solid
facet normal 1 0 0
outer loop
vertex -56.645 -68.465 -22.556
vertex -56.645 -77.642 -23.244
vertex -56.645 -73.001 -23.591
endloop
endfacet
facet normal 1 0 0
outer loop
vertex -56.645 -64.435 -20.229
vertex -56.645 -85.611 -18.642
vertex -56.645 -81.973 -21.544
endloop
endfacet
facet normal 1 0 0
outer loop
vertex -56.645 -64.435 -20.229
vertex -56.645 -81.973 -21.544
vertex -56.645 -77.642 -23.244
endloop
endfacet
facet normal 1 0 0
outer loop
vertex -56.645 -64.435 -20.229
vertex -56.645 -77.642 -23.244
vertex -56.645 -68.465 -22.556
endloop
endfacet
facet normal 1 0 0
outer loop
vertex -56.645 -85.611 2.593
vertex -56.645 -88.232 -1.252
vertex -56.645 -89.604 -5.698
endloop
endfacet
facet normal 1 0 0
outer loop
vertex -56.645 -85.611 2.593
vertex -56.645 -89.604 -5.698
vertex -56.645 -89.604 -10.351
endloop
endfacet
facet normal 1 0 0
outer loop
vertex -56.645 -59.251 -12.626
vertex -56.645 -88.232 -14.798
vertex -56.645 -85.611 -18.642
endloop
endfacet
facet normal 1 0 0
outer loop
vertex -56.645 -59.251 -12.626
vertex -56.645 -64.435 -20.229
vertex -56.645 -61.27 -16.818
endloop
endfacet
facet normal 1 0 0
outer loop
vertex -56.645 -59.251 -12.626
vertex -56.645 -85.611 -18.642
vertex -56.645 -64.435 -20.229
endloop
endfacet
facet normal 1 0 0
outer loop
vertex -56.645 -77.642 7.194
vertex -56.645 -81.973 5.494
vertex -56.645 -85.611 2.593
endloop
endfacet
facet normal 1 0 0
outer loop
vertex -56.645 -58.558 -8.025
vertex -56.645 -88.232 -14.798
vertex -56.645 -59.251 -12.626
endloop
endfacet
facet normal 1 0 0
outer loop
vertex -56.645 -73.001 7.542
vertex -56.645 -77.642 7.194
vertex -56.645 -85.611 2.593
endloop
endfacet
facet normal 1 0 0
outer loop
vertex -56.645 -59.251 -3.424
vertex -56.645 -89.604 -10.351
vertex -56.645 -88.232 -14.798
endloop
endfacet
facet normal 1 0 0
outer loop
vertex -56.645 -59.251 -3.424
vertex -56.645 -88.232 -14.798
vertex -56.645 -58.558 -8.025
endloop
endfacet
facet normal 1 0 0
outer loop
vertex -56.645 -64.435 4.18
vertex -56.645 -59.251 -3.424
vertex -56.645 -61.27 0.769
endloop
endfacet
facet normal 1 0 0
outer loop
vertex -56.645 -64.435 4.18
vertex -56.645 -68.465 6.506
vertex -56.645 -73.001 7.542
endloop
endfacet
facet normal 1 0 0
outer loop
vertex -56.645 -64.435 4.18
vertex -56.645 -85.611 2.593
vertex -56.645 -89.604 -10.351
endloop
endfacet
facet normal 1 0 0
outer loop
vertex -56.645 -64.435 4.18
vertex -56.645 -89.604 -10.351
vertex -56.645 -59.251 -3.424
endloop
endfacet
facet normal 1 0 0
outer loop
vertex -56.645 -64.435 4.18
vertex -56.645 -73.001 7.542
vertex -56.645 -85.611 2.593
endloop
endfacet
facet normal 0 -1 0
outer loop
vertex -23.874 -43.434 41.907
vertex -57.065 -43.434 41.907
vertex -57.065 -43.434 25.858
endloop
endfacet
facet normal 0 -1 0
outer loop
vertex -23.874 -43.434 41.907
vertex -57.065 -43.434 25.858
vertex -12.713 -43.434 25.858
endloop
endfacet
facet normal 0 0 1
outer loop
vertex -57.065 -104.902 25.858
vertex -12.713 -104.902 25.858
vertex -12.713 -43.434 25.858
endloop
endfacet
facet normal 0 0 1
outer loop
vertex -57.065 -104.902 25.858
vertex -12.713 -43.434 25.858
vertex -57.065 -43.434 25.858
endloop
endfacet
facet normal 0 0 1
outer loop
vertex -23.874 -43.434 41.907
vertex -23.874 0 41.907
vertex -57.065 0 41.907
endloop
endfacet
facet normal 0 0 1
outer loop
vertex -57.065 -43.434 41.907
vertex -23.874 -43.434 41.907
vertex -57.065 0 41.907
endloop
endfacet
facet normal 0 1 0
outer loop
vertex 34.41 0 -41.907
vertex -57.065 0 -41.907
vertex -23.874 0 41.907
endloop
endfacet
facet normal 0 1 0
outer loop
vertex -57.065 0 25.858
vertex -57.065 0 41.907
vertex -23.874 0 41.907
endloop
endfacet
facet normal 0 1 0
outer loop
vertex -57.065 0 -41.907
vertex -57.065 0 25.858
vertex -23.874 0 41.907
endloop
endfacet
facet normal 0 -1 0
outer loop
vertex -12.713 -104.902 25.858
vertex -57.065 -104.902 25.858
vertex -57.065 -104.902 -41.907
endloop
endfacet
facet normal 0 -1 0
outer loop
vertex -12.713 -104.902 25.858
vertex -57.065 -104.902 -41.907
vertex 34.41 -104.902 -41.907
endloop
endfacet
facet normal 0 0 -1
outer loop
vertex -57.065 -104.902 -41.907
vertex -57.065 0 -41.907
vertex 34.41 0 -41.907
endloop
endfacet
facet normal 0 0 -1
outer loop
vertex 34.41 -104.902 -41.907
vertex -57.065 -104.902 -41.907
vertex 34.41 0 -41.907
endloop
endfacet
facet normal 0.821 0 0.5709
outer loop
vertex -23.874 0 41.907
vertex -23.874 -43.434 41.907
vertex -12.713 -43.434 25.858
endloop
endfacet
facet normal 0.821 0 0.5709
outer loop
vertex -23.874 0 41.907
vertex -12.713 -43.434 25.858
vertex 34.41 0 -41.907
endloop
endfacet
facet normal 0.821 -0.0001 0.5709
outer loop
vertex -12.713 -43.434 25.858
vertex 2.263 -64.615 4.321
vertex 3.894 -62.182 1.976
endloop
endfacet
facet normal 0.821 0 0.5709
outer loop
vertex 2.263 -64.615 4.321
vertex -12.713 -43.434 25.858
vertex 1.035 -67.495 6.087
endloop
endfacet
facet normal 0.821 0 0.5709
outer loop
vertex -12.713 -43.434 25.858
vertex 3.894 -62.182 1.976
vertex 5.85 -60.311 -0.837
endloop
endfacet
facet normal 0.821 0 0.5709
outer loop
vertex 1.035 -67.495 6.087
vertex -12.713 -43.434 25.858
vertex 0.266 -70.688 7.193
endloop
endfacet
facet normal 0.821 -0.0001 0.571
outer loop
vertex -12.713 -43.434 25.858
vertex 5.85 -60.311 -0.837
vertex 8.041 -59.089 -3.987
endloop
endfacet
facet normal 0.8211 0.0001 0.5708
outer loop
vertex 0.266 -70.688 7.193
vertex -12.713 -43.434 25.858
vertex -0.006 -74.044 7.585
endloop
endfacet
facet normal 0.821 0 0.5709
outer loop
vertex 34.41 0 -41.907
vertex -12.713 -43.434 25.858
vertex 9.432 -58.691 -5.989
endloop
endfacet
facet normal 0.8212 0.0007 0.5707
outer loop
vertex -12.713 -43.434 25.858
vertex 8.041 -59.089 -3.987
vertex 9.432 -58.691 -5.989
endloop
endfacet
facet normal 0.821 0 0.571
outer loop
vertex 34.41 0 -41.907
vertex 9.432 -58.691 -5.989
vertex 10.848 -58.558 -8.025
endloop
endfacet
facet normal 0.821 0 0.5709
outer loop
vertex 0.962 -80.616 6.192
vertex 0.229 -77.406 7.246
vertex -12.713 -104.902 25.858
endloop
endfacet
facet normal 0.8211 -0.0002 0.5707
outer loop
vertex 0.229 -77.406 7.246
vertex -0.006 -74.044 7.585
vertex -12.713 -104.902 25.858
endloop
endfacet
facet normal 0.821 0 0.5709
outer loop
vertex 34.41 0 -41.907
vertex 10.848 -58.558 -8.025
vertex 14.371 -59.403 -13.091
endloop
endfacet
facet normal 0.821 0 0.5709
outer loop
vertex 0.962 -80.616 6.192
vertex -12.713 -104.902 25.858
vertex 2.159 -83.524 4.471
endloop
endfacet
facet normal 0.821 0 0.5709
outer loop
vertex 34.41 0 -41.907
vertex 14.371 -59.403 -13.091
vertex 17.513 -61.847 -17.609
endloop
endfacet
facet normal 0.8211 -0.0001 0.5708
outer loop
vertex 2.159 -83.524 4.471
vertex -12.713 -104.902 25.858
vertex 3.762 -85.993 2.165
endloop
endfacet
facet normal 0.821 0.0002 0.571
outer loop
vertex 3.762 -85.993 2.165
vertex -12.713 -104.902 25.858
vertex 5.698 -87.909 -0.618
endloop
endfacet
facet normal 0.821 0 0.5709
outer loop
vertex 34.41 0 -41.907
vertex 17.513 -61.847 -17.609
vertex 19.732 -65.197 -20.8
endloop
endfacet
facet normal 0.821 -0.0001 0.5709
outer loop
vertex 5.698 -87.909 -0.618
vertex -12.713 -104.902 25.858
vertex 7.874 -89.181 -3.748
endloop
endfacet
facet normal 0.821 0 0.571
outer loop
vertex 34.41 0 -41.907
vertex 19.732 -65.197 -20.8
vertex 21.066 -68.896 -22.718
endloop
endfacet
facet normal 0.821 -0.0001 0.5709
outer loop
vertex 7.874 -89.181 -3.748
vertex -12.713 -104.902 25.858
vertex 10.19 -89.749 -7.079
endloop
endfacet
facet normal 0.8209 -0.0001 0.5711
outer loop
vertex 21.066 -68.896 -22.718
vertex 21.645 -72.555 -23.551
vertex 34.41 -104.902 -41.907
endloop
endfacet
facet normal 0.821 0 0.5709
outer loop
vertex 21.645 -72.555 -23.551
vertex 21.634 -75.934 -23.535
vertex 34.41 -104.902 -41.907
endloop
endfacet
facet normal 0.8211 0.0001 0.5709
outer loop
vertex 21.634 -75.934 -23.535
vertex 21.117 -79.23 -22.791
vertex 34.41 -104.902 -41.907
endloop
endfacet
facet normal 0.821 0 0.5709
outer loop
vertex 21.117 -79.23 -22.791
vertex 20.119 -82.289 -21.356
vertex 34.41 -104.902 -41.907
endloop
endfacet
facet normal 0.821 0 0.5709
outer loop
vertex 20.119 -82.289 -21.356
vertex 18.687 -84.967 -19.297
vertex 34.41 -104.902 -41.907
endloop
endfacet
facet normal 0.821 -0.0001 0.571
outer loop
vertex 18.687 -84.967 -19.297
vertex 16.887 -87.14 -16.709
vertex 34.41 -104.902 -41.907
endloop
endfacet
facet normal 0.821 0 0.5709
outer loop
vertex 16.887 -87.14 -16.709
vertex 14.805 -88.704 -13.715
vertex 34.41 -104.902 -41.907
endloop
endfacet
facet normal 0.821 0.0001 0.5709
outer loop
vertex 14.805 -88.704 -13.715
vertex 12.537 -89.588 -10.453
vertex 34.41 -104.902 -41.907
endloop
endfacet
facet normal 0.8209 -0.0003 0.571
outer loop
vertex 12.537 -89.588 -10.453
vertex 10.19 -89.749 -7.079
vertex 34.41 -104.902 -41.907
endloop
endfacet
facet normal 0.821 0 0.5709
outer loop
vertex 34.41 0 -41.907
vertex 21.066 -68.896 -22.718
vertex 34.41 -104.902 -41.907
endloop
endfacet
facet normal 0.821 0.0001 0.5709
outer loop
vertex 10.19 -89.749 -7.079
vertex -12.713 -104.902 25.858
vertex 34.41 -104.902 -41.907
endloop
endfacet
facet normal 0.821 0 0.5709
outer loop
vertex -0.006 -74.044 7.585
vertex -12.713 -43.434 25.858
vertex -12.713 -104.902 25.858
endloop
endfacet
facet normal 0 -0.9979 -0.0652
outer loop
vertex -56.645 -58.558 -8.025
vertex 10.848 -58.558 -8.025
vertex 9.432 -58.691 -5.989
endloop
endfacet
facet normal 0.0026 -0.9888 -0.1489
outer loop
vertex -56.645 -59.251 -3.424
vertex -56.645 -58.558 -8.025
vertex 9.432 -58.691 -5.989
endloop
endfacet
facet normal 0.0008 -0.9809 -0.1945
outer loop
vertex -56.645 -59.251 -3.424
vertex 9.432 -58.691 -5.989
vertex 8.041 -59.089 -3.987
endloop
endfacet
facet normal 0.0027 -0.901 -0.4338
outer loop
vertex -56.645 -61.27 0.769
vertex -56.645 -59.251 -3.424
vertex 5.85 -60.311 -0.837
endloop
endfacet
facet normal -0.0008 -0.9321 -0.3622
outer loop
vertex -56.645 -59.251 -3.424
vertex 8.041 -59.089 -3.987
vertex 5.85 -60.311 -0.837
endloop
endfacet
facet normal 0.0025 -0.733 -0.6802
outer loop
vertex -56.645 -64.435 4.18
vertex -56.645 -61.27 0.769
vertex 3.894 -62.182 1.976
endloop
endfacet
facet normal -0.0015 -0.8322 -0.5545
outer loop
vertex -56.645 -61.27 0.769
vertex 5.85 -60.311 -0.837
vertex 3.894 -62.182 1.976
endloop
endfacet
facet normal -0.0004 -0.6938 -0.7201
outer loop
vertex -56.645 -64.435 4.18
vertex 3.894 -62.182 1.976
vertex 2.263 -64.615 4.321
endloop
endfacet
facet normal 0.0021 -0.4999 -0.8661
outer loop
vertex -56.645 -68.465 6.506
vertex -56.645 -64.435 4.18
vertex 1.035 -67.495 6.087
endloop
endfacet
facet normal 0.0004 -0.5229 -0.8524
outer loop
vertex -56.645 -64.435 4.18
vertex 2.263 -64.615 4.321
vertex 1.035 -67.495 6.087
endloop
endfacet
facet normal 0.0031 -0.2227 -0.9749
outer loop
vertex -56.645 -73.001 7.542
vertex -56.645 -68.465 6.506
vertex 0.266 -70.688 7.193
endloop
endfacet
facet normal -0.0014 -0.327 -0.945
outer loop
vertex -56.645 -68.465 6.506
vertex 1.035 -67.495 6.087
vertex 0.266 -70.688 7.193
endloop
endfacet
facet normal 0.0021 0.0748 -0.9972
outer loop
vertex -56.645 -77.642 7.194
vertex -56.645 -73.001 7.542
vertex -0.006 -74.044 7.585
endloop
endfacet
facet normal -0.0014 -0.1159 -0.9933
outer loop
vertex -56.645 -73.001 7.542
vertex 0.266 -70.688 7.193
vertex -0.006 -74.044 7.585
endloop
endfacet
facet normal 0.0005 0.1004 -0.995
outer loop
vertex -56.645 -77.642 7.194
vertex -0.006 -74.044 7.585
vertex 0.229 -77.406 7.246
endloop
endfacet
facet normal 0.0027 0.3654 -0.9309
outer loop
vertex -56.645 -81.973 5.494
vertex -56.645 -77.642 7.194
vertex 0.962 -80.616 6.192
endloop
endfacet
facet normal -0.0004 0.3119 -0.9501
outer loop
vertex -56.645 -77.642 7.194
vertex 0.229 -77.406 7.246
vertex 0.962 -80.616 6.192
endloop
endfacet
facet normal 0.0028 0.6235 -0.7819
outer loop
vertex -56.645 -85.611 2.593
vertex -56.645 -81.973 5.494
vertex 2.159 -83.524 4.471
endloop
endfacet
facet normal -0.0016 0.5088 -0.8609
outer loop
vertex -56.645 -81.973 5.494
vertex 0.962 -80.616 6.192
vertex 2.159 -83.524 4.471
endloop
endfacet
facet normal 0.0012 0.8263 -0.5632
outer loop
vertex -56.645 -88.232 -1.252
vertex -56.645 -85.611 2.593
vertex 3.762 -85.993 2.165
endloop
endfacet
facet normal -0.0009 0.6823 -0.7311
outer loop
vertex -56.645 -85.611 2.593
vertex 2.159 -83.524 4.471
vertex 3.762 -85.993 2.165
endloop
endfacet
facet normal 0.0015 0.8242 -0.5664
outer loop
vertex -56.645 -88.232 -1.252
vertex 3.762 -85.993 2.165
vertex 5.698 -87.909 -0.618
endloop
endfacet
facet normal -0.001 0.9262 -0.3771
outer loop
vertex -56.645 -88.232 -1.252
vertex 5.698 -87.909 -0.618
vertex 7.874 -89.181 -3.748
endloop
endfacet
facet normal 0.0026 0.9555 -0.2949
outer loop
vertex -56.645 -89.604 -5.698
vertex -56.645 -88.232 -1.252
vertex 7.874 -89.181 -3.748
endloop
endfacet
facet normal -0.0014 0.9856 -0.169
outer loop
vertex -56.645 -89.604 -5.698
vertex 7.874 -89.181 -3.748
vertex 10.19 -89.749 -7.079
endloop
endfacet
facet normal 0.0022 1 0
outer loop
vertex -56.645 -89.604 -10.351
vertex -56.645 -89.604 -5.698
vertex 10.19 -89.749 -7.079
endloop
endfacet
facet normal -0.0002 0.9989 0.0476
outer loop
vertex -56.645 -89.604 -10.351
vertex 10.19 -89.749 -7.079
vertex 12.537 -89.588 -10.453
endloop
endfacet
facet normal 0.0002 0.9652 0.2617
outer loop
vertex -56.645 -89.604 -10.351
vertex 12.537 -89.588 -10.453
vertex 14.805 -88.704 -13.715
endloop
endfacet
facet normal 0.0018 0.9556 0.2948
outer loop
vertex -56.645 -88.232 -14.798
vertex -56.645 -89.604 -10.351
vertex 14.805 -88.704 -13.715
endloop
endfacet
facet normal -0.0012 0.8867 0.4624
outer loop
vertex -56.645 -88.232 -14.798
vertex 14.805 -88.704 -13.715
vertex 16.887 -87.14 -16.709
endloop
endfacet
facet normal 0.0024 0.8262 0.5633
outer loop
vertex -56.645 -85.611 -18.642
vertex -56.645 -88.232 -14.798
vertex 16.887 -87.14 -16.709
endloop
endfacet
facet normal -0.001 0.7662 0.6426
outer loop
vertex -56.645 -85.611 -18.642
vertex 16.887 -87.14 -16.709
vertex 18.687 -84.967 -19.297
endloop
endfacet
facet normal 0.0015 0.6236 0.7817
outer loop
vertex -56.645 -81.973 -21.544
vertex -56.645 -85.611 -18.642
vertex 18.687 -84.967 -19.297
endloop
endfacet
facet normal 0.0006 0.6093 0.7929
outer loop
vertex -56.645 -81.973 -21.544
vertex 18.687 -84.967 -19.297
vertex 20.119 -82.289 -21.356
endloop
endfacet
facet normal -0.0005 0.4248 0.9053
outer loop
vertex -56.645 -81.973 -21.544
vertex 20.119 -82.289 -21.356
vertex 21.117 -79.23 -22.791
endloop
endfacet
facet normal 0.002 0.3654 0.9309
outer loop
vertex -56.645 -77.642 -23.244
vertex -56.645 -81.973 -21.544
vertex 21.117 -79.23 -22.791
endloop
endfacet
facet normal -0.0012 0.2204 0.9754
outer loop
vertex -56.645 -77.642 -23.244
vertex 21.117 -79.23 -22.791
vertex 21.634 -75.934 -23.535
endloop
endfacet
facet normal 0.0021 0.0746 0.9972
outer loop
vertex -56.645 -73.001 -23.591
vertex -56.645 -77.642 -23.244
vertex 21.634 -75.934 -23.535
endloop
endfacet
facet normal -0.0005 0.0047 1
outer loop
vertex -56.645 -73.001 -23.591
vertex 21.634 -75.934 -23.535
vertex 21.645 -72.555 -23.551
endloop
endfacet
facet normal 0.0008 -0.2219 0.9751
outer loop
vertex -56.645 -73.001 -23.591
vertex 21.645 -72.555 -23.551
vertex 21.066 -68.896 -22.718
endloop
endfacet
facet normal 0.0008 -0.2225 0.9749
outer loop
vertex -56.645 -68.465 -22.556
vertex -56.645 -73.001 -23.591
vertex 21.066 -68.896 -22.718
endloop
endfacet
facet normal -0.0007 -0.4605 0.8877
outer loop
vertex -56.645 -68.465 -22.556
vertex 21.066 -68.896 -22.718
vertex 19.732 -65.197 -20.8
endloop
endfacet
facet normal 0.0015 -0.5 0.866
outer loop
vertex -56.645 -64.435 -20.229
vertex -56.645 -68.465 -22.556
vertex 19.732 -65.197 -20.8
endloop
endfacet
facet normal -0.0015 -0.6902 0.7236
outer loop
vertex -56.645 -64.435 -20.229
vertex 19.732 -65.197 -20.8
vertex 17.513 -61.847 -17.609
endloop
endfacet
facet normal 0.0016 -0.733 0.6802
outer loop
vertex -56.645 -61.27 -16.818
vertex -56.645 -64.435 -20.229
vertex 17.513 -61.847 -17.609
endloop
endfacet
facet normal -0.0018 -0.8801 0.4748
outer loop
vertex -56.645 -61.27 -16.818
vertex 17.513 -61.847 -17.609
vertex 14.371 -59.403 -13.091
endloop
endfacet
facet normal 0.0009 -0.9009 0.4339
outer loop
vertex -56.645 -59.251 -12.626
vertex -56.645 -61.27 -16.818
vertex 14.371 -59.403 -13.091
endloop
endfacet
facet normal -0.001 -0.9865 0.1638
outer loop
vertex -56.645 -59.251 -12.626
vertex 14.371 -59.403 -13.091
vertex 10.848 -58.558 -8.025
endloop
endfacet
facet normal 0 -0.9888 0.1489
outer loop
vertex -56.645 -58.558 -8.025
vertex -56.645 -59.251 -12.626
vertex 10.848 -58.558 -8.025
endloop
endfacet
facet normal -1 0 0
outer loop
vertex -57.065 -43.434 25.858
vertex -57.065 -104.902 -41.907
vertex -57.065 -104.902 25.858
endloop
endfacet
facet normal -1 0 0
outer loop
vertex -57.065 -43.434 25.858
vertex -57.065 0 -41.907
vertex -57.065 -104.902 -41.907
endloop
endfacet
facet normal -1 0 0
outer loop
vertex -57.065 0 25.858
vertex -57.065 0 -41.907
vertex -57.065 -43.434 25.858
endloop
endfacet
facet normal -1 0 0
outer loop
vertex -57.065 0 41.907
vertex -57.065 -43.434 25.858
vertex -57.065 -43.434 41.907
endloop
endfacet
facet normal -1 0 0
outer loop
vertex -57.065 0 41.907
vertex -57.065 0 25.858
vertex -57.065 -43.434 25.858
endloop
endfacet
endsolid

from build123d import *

# Parameters (mm, degrees)
F0_W     = 98.9725068212
F0_H     = 67.7649602294
F1_DEPTH = 25.4
F2_DEPTH = 43.434
F3_DEPTH = 79.502
F4_R     = 15.6101521233
F5_DEPTH = 98.552
F7_DEPTH = 61.468
F9_DEPTH = 113.03


with BuildPart() as f1:
    # F0 (on Front) → F1 (new body)
    with BuildSketch(Plane.XZ):
        Polygon((57.0652261376, 41.9072769582), (-57.0652261376, 41.9072769582), (-57.0652261376, 25.8576832712), (41.9072806835, 25.8576832712), (41.9072806835, -41.9072769582), (57.0652261376, -41.9072769582), align=None)
        with Locations((-7.5789727271, -8.0247968435)):
            Rectangle(F0_W, F0_H)
    extrude(amount=F1_DEPTH)

    # F0 (on Front) → F2 (join)
    with BuildSketch(Plane.XZ):
        Polygon((57.0652261376, 41.9072769582), (-57.0652261376, 41.9072769582), (-57.0652261376, 25.8576832712), (41.9072806835, 25.8576832712), (41.9072806835, -41.9072769582), (57.0652261376, -41.9072769582), align=None)
    extrude(amount=F2_DEPTH)

    # F3 (add): a face of the model
    f3_faces = [f1.faces().sort_by_distance(p)[0] for p in [
        (-7.5789727271, -25.4, -8.0247968435),
    ]]
    extrude(f3_faces, amount=F3_DEPTH)

    # F4 (on face) → F5 (cut)
    with BuildSketch(Plane.YZ.offset(41.9072806835)):
        with Locations((-74.168, -8.0247968435)):
            Circle(F4_R)
    extrude(amount=-F5_DEPTH, mode=Mode.SUBTRACT)

    # F6 (on face) → F7 (cut)
    with BuildSketch(Plane.XZ.offset(104.902)):
        Polygon((-7.5789727271, 25.8576832712), (41.9072806835, -41.9072769582), (41.9072806835, 25.8576832712), align=None)
    extrude(amount=-F7_DEPTH, mode=Mode.SUBTRACT)

    # F8 (on Front) → F9 (cut, symmetric)
    with BuildSketch(Plane.XZ):
        Polygon((40.1673130691, 75.5145400763), (-28.9204549044, 49.1647869349), (43.7020324171, -55.2702136338), (114.3328375611, -6.154642004), align=None)
    extrude(amount=F9_DEPTH, both=True, mode=Mode.SUBTRACT)


solid = f1.part
